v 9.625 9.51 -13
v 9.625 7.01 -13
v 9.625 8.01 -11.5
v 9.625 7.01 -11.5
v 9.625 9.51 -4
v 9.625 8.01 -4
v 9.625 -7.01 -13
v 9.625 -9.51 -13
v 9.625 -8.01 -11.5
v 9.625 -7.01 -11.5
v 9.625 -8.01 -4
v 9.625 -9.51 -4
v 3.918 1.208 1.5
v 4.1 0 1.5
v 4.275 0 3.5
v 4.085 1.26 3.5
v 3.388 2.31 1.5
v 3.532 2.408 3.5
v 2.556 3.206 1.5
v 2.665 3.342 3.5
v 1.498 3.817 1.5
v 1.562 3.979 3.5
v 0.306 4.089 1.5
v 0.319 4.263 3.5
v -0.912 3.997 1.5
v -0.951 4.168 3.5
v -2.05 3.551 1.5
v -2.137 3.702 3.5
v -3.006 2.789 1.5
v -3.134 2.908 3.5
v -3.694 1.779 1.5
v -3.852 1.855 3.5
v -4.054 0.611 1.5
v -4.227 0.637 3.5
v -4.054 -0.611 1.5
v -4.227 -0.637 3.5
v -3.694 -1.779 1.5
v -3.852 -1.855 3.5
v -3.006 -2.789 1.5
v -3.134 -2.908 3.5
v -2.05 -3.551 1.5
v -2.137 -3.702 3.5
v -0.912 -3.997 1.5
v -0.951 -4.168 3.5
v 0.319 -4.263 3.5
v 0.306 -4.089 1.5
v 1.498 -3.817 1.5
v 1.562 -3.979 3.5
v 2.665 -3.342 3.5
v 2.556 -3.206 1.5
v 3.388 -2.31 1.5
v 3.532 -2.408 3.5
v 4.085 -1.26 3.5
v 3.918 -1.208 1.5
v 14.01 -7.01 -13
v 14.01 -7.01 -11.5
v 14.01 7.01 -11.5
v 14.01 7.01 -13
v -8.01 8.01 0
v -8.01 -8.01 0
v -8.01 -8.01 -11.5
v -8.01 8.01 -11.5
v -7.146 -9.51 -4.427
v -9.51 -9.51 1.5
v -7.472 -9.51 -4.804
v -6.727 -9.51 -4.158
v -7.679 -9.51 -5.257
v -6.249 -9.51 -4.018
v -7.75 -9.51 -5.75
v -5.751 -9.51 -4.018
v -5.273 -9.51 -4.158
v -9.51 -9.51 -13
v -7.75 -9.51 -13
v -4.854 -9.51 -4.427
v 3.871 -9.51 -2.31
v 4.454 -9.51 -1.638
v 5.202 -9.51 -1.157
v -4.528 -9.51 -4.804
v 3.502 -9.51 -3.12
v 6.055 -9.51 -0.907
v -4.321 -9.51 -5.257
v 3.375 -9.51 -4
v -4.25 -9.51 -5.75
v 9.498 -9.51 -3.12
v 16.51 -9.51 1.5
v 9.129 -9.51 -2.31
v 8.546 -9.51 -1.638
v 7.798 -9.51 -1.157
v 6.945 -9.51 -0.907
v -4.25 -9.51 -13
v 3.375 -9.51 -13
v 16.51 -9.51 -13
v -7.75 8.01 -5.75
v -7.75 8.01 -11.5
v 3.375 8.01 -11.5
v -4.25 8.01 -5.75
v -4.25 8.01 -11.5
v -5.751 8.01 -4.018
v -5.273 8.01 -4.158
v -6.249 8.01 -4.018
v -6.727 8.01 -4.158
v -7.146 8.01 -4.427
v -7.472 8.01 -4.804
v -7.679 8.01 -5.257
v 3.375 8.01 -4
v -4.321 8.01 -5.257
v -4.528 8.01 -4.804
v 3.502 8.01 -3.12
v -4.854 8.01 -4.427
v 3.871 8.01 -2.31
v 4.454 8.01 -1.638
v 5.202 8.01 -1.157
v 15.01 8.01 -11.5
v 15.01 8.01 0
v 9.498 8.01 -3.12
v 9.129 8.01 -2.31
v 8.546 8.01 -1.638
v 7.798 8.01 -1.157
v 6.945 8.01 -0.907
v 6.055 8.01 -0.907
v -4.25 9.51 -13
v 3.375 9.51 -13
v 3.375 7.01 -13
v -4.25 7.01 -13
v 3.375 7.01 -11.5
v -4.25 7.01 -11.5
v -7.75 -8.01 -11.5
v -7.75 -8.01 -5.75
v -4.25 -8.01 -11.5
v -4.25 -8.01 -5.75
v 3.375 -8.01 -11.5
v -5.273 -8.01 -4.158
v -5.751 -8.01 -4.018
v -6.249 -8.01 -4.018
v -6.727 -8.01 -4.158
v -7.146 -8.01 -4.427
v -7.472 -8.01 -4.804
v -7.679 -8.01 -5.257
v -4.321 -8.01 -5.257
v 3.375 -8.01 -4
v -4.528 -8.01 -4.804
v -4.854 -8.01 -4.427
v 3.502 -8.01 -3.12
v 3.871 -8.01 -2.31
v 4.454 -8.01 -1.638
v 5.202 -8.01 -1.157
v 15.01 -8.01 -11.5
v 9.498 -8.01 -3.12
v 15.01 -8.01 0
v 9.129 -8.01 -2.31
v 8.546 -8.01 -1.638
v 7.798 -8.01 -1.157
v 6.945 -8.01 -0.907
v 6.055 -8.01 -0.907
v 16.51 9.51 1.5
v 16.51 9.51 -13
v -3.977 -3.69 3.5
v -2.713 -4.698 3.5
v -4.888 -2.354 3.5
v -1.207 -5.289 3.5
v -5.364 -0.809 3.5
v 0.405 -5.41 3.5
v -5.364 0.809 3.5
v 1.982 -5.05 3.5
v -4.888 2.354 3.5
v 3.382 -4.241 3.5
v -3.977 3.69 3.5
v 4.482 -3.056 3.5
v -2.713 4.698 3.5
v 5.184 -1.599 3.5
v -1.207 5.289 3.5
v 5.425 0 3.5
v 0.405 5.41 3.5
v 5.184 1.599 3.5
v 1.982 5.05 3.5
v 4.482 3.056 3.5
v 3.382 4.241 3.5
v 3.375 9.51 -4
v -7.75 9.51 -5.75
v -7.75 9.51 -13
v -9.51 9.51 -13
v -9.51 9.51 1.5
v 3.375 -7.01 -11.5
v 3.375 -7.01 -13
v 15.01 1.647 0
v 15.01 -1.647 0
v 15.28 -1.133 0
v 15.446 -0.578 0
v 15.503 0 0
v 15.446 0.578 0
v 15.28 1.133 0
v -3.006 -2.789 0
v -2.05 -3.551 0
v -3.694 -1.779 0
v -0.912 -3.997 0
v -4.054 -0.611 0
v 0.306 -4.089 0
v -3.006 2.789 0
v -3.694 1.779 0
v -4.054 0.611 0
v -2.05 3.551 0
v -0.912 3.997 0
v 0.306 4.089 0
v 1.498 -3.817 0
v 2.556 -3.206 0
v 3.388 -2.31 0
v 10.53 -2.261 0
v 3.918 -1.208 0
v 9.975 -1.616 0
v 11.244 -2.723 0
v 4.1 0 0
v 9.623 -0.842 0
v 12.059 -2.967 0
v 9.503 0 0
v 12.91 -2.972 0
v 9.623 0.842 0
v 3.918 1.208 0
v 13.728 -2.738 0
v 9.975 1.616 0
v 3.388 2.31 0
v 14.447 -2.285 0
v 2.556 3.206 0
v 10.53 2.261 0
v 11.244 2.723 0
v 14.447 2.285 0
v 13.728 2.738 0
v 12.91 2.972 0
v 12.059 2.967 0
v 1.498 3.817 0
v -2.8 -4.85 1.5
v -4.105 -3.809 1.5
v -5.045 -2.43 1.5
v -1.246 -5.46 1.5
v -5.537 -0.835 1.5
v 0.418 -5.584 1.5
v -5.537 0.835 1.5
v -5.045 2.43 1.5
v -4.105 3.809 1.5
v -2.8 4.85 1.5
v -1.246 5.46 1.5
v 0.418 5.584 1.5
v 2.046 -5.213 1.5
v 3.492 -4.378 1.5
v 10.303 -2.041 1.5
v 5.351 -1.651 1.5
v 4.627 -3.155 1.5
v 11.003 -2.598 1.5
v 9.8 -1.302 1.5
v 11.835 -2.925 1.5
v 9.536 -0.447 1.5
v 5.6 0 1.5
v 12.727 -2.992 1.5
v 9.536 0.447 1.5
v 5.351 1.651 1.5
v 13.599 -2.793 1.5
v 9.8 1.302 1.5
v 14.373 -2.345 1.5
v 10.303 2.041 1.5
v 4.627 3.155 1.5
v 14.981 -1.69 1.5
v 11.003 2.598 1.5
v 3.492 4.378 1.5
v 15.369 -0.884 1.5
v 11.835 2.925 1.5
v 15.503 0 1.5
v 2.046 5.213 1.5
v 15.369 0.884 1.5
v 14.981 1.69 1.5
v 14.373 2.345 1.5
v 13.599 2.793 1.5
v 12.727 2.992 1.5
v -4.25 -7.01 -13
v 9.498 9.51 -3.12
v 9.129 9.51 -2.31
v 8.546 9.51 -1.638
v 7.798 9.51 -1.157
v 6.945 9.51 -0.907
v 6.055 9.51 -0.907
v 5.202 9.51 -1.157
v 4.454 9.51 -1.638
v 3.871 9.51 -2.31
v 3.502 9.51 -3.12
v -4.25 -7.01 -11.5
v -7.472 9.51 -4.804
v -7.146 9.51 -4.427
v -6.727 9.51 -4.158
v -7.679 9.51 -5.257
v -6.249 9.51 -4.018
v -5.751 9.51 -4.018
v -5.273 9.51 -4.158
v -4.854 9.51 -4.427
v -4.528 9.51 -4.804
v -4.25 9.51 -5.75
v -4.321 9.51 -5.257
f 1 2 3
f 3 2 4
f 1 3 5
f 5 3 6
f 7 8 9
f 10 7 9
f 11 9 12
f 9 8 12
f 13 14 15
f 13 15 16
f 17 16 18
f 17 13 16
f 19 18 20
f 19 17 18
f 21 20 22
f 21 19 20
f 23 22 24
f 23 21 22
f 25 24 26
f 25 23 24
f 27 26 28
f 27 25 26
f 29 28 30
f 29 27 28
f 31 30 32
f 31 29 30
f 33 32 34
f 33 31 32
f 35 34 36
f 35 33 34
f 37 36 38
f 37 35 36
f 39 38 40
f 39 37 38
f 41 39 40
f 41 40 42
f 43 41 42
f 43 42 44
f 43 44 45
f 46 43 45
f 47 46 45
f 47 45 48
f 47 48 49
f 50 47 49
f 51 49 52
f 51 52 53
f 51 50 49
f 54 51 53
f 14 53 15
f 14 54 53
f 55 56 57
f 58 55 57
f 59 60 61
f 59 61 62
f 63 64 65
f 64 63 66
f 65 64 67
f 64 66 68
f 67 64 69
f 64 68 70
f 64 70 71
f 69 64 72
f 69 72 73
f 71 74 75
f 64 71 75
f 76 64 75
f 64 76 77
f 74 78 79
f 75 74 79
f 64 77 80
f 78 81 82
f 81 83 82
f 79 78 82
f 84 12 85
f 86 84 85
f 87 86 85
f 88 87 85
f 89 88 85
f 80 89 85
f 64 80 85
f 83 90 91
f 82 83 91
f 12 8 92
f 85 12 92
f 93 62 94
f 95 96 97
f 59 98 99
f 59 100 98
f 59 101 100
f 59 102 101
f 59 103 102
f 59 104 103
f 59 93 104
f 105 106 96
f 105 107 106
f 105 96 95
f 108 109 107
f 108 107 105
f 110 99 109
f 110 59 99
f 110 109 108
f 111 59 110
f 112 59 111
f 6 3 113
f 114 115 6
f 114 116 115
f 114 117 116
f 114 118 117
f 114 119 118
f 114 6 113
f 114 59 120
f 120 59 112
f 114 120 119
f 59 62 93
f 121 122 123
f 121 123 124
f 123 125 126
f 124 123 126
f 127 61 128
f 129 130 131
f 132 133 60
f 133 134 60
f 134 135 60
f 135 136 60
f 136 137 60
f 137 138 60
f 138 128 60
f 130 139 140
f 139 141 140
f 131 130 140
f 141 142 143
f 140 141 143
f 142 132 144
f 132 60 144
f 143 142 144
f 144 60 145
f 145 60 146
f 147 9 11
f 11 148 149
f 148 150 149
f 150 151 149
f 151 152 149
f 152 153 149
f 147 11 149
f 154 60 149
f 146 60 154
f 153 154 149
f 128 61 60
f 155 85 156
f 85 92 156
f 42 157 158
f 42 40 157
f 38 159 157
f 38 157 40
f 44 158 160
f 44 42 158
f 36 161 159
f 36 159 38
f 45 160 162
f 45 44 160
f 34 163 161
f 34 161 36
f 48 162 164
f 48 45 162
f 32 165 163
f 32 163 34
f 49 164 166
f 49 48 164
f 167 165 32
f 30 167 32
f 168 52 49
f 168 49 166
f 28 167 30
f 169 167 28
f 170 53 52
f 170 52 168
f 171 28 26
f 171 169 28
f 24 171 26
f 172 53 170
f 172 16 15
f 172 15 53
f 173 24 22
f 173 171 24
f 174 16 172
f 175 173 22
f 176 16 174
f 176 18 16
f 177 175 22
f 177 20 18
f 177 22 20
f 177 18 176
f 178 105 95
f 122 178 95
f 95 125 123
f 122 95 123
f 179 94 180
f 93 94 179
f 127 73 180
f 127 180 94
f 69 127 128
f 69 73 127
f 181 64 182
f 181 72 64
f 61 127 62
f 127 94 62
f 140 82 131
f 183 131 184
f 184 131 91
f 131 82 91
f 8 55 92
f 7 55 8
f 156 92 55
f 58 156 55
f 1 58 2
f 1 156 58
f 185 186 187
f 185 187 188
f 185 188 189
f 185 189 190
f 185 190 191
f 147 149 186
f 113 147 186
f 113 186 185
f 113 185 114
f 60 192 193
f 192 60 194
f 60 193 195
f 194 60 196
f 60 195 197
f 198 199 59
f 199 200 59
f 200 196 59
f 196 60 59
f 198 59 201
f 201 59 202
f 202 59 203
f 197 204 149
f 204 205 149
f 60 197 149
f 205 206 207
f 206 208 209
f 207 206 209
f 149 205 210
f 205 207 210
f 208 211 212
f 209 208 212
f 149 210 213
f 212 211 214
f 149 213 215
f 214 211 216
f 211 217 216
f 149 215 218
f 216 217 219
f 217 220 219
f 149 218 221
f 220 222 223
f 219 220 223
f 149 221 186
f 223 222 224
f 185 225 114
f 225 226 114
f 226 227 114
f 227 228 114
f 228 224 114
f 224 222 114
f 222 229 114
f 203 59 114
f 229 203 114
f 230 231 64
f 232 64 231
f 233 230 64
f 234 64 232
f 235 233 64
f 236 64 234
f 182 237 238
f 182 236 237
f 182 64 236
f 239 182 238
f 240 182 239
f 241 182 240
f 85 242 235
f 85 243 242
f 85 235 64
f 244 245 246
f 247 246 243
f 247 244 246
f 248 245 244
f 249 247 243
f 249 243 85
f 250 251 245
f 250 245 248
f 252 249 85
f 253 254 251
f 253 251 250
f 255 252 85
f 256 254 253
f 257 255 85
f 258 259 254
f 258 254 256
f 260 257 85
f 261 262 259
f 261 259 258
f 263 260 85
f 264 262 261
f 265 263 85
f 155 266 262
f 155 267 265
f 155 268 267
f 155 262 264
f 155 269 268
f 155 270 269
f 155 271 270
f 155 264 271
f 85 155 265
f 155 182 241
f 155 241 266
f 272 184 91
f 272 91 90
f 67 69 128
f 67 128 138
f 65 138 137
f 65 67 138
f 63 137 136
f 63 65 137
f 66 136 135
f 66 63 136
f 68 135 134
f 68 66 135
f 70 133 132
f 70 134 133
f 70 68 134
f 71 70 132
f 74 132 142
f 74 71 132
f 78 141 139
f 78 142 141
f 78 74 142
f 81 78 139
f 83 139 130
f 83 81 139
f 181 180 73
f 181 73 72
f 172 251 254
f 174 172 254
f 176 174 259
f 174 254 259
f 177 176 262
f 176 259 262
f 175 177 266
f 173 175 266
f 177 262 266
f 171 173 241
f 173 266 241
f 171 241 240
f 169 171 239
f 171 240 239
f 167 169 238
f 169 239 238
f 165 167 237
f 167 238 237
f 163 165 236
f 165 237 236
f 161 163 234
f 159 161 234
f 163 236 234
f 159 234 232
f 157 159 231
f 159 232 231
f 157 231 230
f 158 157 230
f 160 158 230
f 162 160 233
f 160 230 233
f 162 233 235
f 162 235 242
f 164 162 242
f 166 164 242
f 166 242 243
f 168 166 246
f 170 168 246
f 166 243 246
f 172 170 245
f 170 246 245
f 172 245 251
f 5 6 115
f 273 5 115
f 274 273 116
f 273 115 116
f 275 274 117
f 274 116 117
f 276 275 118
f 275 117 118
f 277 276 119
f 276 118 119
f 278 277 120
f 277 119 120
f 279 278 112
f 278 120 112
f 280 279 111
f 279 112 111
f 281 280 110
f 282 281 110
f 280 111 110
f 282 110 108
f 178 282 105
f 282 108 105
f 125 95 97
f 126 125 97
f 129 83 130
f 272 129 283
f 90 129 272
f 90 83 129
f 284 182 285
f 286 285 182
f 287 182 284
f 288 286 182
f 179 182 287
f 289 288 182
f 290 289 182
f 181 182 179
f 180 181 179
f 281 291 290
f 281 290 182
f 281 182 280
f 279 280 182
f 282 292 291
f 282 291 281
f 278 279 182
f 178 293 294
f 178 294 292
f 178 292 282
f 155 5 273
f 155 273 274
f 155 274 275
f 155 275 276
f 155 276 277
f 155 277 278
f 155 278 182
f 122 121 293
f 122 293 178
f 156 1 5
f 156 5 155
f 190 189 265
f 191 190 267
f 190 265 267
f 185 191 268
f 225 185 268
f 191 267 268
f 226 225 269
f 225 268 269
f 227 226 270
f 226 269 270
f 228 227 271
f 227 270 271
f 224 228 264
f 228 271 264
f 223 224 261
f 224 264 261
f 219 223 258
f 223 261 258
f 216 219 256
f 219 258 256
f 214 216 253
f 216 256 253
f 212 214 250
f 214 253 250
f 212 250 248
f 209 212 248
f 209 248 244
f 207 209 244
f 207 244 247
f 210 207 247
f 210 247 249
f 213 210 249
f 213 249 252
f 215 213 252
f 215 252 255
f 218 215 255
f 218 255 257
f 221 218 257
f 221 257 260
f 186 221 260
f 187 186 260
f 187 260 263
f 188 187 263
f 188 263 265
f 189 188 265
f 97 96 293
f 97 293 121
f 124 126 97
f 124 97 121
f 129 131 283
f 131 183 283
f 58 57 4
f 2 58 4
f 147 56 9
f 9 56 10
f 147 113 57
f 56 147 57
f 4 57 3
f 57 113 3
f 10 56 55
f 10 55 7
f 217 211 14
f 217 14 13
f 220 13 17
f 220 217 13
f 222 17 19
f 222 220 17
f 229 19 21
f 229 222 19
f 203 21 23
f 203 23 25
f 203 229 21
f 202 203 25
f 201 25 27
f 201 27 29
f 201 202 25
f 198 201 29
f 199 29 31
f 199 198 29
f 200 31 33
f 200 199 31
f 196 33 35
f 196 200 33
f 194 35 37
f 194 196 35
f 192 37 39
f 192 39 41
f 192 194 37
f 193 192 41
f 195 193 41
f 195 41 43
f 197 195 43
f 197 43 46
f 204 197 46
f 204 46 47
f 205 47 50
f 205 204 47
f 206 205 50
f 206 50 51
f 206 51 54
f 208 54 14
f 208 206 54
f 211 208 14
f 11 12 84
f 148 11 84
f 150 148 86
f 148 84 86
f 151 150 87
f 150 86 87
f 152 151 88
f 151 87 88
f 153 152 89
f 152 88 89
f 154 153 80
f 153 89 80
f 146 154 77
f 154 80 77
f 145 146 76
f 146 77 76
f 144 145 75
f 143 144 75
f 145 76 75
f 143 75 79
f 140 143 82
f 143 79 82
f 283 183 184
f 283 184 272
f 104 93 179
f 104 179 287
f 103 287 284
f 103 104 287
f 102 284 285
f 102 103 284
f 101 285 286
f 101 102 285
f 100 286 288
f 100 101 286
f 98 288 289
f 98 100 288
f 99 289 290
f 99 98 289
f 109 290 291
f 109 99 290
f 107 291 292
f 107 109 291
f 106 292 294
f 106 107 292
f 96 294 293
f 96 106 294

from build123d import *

# Parameters (mm, degrees)
SKETCH1_W           = 26.02
SKETCH1_H           = 19.02
SKETCH1_W_2         = 23.02
SKETCH1_H_2         = 16.02
BOSS_EXTRUDE1_DEPTH = 11.5
SKETCH2_W           = 26.02
SKETCH2_H           = 19.02
SKETCH2_W_2         = 21.02
SKETCH2_H_2         = 14.02
BOSS_EXTRUDE2_DEPTH = 1.5
SKETCH3_W           = 26.02
SKETCH3_H           = 19.02
SKETCH3_R           = 4.1
BOSS_EXTRUDE3_DEPTH = 1.5
SKETCH4_R           = 5.6
SKETCH4_R_2         = 4.1
BOSS_EXTRUDE4_DEPTH = 2
BOSS_EXTRUDE4_DRAFT = 5
SKETCH5_R           = 3
CUT_EXTRUDE1_DEPTH  = 1.5
CUT_EXTRUDE2_DEPTH  = 29.343261986


with BuildPart() as part:
    # Sketch1 → Boss-Extrude1 (new body)
    with BuildSketch(Plane.XY):
        with Locations((3.5, 0)):
            Rectangle(SKETCH1_W, SKETCH1_H)
        with Locations((3.5, 0)):
            Rectangle(SKETCH1_W_2, SKETCH1_H_2, mode=Mode.SUBTRACT)
    extrude(amount=-BOSS_EXTRUDE1_DEPTH)

    # Sketch2 → Boss-Extrude2 (add)
    with BuildSketch(Plane(origin=(0, 0, -11.5), x_dir=(-1, 0, 0), z_dir=(0, 0, -1))):
        with Locations((-3.5, 0)):
            Rectangle(SKETCH2_W, SKETCH2_H)
        with Locations((-3.5, 0)):
            Rectangle(SKETCH2_W_2, SKETCH2_H_2, mode=Mode.SUBTRACT)
    extrude(amount=BOSS_EXTRUDE2_DEPTH)

    # Sketch3 → Boss-Extrude3 (add)
    with BuildSketch(Plane.XY):
        with Locations((3.5, 0)):
            Rectangle(SKETCH3_W, SKETCH3_H)
        Circle(SKETCH3_R, mode=Mode.SUBTRACT)
    extrude(amount=BOSS_EXTRUDE3_DEPTH)


with BuildPart() as boss_extrude4_tool:
    # Sketch4 → Boss-Extrude4 (with draft: the straight prism first)
    with BuildSketch(Plane.XY.offset(1.5)):
        Circle(SKETCH4_R)
        Circle(SKETCH4_R_2, mode=Mode.SUBTRACT)
    extrude(amount=BOSS_EXTRUDE4_DEPTH)
    # Boss-Extrude4: the draft: its side faces are tilted about the plane it starts from
    boss_extrude4_sides = [boss_extrude4_tool.faces().sort_by_distance(p)[0] for p in [
        (-5.6, 0, 2.5),
        (-4.1, 0, 2.5),
    ]]
    draft(boss_extrude4_sides, Plane.XY.offset(1.5), BOSS_EXTRUDE4_DRAFT)


with BuildPart() as part_1:
    add(part.part)

    # Boss-Extrude4: add boss_extrude4_tool
    add(boss_extrude4_tool.part)

    # Sketch5 → Cut-Extrude1 (cut)
    with BuildSketch(Plane.XY.offset(1.5)):
        with Locations((12.502526503, 1e-09)):
            Circle(SKETCH5_R)
    extrude(amount=-CUT_EXTRUDE1_DEPTH, mode=Mode.SUBTRACT)

    # Sketch6 → Cut-Extrude2 (cut, through all)
    with BuildSketch(Plane.XZ.offset(9.51)):
        with BuildLine():
            Line((3.375, -4), (3.375, -13))
            Line((3.375, -13), (9.625, -13))
            Line((9.625, -13), (9.625, -4))
            ThreePointArc((9.625, -4), (6.5, -0.875), (3.375, -4))
        make_face()
        with BuildLine():
            Line((-4.25, -5.75), (-4.25, -13))
            Line((-4.25, -13), (-7.75, -13))
            Line((-7.75, -13), (-7.75, -5.75))
            ThreePointArc((-7.75, -5.75), (-6, -4), (-4.25, -5.75))
        make_face()
    extrude(amount=-CUT_EXTRUDE2_DEPTH, mode=Mode.SUBTRACT)


solid = part_1.part
